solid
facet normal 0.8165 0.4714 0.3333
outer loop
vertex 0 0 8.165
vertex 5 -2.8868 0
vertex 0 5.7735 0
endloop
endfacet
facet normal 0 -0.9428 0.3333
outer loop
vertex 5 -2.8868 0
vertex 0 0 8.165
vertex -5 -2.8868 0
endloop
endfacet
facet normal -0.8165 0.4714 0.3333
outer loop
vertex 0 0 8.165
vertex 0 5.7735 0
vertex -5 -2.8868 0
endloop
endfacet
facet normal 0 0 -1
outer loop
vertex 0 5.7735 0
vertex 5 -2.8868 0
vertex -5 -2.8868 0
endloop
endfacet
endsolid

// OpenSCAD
/********************************************
Tetrahedron.scad
By Adam Anderson

A simple module for creating a tetrahedron.
********************************************/

tetrahedron(5);

module tetrahedron(size) {
    polyhedron( 
        points = [ 
            [0, size * (sqrt(3) - (1 / sqrt(3))), 0], 
            [size, size * (-1 / sqrt(3)), 0], 
            [-size, size * (-1 / sqrt(3)), 0],
            [0, 0, size * 2 * sqrt(2 / 3)]
        ], 
        faces = [
            [0, 1, 3],
            [2, 3, 1], 
            [2, 0, 3],
            [2, 1, 0]
        ]
    );
}
